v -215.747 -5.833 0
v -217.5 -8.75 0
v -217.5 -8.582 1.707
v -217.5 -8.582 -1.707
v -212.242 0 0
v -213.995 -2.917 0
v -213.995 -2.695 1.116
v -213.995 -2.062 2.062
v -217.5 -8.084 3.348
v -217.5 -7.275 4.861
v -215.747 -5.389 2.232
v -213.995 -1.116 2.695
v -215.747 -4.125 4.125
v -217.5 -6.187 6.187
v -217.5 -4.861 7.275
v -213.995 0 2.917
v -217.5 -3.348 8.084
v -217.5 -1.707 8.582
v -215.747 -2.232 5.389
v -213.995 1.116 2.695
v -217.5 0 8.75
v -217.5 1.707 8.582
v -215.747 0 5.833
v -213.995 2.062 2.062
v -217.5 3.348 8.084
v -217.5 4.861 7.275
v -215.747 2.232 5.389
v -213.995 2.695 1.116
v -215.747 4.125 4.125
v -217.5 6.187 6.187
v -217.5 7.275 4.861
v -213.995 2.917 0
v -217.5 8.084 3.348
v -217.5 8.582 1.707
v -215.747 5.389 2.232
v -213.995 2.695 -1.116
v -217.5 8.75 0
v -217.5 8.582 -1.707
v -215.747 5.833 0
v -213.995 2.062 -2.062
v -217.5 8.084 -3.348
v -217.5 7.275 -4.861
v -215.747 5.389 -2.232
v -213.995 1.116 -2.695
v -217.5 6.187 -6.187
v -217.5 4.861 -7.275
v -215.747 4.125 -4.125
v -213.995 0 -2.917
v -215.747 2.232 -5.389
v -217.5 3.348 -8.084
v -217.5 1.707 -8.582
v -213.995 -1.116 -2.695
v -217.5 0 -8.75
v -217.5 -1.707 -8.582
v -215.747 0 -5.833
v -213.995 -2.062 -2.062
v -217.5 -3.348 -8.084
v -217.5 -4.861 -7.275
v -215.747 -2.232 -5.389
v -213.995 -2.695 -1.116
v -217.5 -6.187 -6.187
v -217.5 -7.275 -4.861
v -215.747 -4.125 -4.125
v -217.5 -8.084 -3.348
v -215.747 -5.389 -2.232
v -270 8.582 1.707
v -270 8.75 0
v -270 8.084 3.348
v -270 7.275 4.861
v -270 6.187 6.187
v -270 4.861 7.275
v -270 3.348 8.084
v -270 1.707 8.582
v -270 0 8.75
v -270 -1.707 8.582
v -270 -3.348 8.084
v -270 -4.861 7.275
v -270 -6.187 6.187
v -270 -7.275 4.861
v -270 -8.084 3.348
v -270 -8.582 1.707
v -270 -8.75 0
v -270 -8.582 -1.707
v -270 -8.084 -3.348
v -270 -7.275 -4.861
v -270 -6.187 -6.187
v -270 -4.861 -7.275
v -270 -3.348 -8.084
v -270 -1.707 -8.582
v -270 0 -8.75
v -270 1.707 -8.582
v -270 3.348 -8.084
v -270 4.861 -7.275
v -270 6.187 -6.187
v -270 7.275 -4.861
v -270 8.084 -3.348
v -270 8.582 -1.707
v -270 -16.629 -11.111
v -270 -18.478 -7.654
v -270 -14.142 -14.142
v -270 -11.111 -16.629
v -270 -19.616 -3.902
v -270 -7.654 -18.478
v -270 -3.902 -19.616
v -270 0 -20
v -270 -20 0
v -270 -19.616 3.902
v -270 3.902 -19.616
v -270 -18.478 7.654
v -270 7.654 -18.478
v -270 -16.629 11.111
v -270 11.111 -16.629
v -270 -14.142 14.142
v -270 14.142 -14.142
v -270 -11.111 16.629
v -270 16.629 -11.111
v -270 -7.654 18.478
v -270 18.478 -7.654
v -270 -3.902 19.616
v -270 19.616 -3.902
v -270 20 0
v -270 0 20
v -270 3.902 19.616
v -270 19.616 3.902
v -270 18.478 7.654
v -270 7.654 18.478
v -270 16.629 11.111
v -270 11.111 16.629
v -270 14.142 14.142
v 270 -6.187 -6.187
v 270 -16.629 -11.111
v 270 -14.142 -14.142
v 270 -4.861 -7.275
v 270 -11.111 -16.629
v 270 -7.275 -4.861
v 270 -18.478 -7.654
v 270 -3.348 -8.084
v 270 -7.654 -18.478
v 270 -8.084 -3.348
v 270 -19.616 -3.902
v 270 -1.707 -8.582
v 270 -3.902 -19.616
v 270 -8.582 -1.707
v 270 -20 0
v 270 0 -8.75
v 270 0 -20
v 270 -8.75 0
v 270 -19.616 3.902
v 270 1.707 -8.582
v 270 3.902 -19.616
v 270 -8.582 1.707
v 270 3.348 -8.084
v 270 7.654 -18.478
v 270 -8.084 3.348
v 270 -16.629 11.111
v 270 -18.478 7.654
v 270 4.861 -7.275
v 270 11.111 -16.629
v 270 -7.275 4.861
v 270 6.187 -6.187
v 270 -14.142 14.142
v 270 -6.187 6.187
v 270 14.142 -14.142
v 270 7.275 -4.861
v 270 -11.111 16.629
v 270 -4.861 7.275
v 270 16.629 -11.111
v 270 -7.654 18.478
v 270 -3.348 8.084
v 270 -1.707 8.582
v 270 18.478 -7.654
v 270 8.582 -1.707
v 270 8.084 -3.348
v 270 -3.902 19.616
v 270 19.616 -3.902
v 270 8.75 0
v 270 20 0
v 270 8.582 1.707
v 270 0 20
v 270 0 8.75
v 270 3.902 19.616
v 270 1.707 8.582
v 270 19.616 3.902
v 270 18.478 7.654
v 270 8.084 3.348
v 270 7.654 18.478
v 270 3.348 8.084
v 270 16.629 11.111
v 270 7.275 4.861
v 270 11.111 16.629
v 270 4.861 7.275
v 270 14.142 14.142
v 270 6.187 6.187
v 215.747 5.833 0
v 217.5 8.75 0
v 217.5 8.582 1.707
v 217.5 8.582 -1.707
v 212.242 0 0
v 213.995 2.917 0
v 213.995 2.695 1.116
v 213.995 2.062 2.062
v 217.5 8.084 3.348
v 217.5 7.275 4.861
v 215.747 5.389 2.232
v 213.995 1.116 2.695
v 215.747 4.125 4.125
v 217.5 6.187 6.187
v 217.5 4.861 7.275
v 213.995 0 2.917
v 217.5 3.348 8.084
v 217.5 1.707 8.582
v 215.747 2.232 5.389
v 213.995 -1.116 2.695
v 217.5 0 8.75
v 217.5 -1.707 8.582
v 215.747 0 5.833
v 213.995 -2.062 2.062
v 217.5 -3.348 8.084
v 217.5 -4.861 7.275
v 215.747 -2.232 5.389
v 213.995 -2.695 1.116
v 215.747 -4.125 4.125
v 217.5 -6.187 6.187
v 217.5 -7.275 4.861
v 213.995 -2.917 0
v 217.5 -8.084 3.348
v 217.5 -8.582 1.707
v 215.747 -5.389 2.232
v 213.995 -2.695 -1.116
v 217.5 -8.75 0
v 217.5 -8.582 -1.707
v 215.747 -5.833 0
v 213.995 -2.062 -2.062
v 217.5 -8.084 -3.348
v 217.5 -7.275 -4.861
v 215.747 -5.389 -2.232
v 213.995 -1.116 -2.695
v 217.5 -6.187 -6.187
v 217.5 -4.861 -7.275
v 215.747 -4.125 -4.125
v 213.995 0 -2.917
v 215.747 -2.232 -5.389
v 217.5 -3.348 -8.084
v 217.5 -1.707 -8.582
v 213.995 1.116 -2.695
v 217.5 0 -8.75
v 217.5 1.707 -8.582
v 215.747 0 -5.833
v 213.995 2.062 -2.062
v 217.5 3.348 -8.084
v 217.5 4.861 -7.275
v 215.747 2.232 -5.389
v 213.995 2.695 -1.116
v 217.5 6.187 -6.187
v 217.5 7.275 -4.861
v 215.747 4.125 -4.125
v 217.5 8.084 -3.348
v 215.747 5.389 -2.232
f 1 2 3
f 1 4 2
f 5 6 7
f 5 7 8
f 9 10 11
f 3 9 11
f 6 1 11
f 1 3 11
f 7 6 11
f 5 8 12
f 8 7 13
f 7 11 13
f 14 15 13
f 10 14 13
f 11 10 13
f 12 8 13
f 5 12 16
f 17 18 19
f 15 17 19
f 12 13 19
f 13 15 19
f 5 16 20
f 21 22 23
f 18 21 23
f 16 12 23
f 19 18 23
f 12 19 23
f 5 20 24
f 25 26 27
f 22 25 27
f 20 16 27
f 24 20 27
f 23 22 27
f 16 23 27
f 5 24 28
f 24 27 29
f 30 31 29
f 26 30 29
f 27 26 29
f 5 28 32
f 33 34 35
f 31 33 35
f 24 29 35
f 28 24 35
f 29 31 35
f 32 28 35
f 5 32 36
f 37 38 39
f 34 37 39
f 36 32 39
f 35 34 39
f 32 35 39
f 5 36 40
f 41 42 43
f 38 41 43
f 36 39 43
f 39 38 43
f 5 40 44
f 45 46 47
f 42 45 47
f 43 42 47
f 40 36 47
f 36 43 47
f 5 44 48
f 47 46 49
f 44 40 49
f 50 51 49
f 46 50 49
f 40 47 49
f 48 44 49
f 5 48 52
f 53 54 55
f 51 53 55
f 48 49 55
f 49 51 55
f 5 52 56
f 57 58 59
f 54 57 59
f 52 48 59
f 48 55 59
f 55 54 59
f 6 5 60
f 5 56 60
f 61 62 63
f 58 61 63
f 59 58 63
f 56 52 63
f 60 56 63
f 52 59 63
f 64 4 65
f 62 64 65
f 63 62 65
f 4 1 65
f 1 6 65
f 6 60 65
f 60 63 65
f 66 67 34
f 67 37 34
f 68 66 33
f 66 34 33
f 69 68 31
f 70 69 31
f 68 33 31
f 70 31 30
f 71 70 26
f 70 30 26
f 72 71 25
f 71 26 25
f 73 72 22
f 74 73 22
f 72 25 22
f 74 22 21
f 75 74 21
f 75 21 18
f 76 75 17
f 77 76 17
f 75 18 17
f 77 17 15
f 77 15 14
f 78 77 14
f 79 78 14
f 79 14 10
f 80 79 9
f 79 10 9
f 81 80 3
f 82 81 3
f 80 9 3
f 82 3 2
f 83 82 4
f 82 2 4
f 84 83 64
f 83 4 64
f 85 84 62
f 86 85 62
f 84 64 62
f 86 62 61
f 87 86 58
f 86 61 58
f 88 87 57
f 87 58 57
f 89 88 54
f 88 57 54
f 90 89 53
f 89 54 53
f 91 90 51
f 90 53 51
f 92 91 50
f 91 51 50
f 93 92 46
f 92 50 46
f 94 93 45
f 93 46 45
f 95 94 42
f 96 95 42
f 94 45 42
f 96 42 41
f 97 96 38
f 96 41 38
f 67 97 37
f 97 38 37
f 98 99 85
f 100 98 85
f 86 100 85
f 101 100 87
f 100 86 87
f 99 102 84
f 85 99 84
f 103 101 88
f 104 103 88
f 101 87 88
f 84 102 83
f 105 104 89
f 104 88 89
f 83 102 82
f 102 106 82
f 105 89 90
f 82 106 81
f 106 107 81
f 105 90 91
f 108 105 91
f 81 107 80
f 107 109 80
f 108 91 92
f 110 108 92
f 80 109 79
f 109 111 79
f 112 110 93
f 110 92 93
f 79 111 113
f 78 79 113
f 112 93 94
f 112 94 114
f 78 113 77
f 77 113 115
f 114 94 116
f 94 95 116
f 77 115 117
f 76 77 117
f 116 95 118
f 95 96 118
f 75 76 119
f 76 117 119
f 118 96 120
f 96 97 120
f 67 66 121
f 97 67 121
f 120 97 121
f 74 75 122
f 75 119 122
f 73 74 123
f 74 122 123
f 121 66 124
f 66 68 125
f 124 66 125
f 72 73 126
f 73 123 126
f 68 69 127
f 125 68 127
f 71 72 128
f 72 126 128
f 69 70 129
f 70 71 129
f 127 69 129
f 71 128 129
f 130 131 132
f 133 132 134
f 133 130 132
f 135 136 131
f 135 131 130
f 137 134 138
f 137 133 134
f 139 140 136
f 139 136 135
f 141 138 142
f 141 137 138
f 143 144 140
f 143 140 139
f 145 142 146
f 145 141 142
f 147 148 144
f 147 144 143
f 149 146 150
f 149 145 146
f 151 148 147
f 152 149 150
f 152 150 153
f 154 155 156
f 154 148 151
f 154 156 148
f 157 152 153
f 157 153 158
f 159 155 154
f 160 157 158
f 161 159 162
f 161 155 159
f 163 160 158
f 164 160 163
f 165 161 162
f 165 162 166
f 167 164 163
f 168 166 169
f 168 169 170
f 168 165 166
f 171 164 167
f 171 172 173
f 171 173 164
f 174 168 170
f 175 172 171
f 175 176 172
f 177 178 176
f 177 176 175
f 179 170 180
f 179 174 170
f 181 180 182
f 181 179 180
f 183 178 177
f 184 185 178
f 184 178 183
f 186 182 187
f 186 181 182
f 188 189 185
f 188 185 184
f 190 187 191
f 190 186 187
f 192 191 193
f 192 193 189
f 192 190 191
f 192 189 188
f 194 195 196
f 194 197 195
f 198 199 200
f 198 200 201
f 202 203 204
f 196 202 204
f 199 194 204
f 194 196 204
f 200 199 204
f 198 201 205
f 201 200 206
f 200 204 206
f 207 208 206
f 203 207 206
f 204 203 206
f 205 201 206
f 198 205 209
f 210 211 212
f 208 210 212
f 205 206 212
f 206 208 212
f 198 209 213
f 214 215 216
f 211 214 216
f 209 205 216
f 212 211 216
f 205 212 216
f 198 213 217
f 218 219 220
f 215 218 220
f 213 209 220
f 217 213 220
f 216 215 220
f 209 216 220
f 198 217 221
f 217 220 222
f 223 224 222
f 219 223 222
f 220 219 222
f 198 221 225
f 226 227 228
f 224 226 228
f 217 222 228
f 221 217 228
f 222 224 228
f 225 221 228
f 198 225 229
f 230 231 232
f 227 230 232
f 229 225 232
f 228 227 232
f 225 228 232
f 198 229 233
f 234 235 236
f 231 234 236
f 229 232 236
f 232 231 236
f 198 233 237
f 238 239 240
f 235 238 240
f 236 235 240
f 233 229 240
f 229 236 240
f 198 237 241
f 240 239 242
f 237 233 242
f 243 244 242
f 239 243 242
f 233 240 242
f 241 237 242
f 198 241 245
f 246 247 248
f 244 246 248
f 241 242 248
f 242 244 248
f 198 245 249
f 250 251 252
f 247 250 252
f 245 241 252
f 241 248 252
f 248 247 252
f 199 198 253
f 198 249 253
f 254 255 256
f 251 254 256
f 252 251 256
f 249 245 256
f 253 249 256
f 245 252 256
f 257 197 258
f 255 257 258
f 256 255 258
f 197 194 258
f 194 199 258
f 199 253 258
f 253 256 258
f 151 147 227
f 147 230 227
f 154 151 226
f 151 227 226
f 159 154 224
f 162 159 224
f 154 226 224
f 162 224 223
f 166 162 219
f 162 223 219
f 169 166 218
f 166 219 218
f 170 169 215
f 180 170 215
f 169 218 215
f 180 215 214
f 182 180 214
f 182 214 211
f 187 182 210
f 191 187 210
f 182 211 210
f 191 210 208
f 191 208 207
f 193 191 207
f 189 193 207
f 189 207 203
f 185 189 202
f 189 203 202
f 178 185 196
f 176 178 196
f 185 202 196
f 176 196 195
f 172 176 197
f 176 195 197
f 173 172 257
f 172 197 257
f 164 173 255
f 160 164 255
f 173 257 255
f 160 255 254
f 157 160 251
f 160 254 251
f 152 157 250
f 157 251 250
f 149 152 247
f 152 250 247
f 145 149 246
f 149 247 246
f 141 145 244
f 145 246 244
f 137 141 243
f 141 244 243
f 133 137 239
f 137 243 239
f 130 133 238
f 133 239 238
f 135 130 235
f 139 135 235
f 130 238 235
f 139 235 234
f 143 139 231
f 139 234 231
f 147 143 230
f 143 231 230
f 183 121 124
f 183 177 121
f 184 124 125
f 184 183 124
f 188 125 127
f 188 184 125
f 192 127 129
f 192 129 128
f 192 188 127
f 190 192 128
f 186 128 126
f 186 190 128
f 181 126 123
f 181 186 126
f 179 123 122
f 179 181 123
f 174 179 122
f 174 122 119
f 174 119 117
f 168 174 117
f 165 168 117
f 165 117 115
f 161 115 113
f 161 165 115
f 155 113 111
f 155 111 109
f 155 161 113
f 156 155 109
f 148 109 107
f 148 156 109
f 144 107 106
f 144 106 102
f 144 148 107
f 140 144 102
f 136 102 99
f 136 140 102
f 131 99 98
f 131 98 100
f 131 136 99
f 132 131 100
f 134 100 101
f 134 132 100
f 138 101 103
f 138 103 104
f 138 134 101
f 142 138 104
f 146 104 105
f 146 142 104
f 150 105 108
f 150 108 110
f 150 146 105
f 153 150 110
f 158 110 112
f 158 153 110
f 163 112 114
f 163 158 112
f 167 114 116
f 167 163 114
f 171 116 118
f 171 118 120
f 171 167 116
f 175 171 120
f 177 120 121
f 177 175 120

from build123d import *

# Parameters (mm, degrees)
F0_R           = 20
F1_DEPTH       = 270
F4_D           = 17.5
F4_DEPTH       = 52.5
F4_TIP         = 5.2575304165
F4_ON_F3_D     = 17.5
F4_ON_F3_DEPTH = 52.5
F4_ON_F3_TIP   = 5.2575304165


with BuildPart() as f1:
    # F0 (on Right) → F1 (new body, symmetric)
    with BuildSketch(Plane.YZ):
        Circle(F0_R)
    extrude(amount=F1_DEPTH, both=True)

    # F4
    with Locations(Plane.YZ.offset(270)):
        with Locations((0, 0)):
            Hole(F4_D / 2, depth=F4_DEPTH)
            with Locations((0, 0, -(F4_DEPTH + F4_TIP / 2))):  # 118° drill point
                Cone(0, F4_D / 2, F4_TIP, mode=Mode.SUBTRACT)

    # F4 on F3
    with Locations(Plane(origin=(-270, 0, 0), x_dir=(0, -1, 0), z_dir=(-1, 0, 0))):
        with Locations((0, 0)):
            Hole(F4_ON_F3_D / 2, depth=F4_ON_F3_DEPTH)
            with Locations((0, 0, -(F4_ON_F3_DEPTH + F4_ON_F3_TIP / 2))):  # 118° drill point
                Cone(0, F4_ON_F3_D / 2, F4_ON_F3_TIP, mode=Mode.SUBTRACT)


solid = f1.part
